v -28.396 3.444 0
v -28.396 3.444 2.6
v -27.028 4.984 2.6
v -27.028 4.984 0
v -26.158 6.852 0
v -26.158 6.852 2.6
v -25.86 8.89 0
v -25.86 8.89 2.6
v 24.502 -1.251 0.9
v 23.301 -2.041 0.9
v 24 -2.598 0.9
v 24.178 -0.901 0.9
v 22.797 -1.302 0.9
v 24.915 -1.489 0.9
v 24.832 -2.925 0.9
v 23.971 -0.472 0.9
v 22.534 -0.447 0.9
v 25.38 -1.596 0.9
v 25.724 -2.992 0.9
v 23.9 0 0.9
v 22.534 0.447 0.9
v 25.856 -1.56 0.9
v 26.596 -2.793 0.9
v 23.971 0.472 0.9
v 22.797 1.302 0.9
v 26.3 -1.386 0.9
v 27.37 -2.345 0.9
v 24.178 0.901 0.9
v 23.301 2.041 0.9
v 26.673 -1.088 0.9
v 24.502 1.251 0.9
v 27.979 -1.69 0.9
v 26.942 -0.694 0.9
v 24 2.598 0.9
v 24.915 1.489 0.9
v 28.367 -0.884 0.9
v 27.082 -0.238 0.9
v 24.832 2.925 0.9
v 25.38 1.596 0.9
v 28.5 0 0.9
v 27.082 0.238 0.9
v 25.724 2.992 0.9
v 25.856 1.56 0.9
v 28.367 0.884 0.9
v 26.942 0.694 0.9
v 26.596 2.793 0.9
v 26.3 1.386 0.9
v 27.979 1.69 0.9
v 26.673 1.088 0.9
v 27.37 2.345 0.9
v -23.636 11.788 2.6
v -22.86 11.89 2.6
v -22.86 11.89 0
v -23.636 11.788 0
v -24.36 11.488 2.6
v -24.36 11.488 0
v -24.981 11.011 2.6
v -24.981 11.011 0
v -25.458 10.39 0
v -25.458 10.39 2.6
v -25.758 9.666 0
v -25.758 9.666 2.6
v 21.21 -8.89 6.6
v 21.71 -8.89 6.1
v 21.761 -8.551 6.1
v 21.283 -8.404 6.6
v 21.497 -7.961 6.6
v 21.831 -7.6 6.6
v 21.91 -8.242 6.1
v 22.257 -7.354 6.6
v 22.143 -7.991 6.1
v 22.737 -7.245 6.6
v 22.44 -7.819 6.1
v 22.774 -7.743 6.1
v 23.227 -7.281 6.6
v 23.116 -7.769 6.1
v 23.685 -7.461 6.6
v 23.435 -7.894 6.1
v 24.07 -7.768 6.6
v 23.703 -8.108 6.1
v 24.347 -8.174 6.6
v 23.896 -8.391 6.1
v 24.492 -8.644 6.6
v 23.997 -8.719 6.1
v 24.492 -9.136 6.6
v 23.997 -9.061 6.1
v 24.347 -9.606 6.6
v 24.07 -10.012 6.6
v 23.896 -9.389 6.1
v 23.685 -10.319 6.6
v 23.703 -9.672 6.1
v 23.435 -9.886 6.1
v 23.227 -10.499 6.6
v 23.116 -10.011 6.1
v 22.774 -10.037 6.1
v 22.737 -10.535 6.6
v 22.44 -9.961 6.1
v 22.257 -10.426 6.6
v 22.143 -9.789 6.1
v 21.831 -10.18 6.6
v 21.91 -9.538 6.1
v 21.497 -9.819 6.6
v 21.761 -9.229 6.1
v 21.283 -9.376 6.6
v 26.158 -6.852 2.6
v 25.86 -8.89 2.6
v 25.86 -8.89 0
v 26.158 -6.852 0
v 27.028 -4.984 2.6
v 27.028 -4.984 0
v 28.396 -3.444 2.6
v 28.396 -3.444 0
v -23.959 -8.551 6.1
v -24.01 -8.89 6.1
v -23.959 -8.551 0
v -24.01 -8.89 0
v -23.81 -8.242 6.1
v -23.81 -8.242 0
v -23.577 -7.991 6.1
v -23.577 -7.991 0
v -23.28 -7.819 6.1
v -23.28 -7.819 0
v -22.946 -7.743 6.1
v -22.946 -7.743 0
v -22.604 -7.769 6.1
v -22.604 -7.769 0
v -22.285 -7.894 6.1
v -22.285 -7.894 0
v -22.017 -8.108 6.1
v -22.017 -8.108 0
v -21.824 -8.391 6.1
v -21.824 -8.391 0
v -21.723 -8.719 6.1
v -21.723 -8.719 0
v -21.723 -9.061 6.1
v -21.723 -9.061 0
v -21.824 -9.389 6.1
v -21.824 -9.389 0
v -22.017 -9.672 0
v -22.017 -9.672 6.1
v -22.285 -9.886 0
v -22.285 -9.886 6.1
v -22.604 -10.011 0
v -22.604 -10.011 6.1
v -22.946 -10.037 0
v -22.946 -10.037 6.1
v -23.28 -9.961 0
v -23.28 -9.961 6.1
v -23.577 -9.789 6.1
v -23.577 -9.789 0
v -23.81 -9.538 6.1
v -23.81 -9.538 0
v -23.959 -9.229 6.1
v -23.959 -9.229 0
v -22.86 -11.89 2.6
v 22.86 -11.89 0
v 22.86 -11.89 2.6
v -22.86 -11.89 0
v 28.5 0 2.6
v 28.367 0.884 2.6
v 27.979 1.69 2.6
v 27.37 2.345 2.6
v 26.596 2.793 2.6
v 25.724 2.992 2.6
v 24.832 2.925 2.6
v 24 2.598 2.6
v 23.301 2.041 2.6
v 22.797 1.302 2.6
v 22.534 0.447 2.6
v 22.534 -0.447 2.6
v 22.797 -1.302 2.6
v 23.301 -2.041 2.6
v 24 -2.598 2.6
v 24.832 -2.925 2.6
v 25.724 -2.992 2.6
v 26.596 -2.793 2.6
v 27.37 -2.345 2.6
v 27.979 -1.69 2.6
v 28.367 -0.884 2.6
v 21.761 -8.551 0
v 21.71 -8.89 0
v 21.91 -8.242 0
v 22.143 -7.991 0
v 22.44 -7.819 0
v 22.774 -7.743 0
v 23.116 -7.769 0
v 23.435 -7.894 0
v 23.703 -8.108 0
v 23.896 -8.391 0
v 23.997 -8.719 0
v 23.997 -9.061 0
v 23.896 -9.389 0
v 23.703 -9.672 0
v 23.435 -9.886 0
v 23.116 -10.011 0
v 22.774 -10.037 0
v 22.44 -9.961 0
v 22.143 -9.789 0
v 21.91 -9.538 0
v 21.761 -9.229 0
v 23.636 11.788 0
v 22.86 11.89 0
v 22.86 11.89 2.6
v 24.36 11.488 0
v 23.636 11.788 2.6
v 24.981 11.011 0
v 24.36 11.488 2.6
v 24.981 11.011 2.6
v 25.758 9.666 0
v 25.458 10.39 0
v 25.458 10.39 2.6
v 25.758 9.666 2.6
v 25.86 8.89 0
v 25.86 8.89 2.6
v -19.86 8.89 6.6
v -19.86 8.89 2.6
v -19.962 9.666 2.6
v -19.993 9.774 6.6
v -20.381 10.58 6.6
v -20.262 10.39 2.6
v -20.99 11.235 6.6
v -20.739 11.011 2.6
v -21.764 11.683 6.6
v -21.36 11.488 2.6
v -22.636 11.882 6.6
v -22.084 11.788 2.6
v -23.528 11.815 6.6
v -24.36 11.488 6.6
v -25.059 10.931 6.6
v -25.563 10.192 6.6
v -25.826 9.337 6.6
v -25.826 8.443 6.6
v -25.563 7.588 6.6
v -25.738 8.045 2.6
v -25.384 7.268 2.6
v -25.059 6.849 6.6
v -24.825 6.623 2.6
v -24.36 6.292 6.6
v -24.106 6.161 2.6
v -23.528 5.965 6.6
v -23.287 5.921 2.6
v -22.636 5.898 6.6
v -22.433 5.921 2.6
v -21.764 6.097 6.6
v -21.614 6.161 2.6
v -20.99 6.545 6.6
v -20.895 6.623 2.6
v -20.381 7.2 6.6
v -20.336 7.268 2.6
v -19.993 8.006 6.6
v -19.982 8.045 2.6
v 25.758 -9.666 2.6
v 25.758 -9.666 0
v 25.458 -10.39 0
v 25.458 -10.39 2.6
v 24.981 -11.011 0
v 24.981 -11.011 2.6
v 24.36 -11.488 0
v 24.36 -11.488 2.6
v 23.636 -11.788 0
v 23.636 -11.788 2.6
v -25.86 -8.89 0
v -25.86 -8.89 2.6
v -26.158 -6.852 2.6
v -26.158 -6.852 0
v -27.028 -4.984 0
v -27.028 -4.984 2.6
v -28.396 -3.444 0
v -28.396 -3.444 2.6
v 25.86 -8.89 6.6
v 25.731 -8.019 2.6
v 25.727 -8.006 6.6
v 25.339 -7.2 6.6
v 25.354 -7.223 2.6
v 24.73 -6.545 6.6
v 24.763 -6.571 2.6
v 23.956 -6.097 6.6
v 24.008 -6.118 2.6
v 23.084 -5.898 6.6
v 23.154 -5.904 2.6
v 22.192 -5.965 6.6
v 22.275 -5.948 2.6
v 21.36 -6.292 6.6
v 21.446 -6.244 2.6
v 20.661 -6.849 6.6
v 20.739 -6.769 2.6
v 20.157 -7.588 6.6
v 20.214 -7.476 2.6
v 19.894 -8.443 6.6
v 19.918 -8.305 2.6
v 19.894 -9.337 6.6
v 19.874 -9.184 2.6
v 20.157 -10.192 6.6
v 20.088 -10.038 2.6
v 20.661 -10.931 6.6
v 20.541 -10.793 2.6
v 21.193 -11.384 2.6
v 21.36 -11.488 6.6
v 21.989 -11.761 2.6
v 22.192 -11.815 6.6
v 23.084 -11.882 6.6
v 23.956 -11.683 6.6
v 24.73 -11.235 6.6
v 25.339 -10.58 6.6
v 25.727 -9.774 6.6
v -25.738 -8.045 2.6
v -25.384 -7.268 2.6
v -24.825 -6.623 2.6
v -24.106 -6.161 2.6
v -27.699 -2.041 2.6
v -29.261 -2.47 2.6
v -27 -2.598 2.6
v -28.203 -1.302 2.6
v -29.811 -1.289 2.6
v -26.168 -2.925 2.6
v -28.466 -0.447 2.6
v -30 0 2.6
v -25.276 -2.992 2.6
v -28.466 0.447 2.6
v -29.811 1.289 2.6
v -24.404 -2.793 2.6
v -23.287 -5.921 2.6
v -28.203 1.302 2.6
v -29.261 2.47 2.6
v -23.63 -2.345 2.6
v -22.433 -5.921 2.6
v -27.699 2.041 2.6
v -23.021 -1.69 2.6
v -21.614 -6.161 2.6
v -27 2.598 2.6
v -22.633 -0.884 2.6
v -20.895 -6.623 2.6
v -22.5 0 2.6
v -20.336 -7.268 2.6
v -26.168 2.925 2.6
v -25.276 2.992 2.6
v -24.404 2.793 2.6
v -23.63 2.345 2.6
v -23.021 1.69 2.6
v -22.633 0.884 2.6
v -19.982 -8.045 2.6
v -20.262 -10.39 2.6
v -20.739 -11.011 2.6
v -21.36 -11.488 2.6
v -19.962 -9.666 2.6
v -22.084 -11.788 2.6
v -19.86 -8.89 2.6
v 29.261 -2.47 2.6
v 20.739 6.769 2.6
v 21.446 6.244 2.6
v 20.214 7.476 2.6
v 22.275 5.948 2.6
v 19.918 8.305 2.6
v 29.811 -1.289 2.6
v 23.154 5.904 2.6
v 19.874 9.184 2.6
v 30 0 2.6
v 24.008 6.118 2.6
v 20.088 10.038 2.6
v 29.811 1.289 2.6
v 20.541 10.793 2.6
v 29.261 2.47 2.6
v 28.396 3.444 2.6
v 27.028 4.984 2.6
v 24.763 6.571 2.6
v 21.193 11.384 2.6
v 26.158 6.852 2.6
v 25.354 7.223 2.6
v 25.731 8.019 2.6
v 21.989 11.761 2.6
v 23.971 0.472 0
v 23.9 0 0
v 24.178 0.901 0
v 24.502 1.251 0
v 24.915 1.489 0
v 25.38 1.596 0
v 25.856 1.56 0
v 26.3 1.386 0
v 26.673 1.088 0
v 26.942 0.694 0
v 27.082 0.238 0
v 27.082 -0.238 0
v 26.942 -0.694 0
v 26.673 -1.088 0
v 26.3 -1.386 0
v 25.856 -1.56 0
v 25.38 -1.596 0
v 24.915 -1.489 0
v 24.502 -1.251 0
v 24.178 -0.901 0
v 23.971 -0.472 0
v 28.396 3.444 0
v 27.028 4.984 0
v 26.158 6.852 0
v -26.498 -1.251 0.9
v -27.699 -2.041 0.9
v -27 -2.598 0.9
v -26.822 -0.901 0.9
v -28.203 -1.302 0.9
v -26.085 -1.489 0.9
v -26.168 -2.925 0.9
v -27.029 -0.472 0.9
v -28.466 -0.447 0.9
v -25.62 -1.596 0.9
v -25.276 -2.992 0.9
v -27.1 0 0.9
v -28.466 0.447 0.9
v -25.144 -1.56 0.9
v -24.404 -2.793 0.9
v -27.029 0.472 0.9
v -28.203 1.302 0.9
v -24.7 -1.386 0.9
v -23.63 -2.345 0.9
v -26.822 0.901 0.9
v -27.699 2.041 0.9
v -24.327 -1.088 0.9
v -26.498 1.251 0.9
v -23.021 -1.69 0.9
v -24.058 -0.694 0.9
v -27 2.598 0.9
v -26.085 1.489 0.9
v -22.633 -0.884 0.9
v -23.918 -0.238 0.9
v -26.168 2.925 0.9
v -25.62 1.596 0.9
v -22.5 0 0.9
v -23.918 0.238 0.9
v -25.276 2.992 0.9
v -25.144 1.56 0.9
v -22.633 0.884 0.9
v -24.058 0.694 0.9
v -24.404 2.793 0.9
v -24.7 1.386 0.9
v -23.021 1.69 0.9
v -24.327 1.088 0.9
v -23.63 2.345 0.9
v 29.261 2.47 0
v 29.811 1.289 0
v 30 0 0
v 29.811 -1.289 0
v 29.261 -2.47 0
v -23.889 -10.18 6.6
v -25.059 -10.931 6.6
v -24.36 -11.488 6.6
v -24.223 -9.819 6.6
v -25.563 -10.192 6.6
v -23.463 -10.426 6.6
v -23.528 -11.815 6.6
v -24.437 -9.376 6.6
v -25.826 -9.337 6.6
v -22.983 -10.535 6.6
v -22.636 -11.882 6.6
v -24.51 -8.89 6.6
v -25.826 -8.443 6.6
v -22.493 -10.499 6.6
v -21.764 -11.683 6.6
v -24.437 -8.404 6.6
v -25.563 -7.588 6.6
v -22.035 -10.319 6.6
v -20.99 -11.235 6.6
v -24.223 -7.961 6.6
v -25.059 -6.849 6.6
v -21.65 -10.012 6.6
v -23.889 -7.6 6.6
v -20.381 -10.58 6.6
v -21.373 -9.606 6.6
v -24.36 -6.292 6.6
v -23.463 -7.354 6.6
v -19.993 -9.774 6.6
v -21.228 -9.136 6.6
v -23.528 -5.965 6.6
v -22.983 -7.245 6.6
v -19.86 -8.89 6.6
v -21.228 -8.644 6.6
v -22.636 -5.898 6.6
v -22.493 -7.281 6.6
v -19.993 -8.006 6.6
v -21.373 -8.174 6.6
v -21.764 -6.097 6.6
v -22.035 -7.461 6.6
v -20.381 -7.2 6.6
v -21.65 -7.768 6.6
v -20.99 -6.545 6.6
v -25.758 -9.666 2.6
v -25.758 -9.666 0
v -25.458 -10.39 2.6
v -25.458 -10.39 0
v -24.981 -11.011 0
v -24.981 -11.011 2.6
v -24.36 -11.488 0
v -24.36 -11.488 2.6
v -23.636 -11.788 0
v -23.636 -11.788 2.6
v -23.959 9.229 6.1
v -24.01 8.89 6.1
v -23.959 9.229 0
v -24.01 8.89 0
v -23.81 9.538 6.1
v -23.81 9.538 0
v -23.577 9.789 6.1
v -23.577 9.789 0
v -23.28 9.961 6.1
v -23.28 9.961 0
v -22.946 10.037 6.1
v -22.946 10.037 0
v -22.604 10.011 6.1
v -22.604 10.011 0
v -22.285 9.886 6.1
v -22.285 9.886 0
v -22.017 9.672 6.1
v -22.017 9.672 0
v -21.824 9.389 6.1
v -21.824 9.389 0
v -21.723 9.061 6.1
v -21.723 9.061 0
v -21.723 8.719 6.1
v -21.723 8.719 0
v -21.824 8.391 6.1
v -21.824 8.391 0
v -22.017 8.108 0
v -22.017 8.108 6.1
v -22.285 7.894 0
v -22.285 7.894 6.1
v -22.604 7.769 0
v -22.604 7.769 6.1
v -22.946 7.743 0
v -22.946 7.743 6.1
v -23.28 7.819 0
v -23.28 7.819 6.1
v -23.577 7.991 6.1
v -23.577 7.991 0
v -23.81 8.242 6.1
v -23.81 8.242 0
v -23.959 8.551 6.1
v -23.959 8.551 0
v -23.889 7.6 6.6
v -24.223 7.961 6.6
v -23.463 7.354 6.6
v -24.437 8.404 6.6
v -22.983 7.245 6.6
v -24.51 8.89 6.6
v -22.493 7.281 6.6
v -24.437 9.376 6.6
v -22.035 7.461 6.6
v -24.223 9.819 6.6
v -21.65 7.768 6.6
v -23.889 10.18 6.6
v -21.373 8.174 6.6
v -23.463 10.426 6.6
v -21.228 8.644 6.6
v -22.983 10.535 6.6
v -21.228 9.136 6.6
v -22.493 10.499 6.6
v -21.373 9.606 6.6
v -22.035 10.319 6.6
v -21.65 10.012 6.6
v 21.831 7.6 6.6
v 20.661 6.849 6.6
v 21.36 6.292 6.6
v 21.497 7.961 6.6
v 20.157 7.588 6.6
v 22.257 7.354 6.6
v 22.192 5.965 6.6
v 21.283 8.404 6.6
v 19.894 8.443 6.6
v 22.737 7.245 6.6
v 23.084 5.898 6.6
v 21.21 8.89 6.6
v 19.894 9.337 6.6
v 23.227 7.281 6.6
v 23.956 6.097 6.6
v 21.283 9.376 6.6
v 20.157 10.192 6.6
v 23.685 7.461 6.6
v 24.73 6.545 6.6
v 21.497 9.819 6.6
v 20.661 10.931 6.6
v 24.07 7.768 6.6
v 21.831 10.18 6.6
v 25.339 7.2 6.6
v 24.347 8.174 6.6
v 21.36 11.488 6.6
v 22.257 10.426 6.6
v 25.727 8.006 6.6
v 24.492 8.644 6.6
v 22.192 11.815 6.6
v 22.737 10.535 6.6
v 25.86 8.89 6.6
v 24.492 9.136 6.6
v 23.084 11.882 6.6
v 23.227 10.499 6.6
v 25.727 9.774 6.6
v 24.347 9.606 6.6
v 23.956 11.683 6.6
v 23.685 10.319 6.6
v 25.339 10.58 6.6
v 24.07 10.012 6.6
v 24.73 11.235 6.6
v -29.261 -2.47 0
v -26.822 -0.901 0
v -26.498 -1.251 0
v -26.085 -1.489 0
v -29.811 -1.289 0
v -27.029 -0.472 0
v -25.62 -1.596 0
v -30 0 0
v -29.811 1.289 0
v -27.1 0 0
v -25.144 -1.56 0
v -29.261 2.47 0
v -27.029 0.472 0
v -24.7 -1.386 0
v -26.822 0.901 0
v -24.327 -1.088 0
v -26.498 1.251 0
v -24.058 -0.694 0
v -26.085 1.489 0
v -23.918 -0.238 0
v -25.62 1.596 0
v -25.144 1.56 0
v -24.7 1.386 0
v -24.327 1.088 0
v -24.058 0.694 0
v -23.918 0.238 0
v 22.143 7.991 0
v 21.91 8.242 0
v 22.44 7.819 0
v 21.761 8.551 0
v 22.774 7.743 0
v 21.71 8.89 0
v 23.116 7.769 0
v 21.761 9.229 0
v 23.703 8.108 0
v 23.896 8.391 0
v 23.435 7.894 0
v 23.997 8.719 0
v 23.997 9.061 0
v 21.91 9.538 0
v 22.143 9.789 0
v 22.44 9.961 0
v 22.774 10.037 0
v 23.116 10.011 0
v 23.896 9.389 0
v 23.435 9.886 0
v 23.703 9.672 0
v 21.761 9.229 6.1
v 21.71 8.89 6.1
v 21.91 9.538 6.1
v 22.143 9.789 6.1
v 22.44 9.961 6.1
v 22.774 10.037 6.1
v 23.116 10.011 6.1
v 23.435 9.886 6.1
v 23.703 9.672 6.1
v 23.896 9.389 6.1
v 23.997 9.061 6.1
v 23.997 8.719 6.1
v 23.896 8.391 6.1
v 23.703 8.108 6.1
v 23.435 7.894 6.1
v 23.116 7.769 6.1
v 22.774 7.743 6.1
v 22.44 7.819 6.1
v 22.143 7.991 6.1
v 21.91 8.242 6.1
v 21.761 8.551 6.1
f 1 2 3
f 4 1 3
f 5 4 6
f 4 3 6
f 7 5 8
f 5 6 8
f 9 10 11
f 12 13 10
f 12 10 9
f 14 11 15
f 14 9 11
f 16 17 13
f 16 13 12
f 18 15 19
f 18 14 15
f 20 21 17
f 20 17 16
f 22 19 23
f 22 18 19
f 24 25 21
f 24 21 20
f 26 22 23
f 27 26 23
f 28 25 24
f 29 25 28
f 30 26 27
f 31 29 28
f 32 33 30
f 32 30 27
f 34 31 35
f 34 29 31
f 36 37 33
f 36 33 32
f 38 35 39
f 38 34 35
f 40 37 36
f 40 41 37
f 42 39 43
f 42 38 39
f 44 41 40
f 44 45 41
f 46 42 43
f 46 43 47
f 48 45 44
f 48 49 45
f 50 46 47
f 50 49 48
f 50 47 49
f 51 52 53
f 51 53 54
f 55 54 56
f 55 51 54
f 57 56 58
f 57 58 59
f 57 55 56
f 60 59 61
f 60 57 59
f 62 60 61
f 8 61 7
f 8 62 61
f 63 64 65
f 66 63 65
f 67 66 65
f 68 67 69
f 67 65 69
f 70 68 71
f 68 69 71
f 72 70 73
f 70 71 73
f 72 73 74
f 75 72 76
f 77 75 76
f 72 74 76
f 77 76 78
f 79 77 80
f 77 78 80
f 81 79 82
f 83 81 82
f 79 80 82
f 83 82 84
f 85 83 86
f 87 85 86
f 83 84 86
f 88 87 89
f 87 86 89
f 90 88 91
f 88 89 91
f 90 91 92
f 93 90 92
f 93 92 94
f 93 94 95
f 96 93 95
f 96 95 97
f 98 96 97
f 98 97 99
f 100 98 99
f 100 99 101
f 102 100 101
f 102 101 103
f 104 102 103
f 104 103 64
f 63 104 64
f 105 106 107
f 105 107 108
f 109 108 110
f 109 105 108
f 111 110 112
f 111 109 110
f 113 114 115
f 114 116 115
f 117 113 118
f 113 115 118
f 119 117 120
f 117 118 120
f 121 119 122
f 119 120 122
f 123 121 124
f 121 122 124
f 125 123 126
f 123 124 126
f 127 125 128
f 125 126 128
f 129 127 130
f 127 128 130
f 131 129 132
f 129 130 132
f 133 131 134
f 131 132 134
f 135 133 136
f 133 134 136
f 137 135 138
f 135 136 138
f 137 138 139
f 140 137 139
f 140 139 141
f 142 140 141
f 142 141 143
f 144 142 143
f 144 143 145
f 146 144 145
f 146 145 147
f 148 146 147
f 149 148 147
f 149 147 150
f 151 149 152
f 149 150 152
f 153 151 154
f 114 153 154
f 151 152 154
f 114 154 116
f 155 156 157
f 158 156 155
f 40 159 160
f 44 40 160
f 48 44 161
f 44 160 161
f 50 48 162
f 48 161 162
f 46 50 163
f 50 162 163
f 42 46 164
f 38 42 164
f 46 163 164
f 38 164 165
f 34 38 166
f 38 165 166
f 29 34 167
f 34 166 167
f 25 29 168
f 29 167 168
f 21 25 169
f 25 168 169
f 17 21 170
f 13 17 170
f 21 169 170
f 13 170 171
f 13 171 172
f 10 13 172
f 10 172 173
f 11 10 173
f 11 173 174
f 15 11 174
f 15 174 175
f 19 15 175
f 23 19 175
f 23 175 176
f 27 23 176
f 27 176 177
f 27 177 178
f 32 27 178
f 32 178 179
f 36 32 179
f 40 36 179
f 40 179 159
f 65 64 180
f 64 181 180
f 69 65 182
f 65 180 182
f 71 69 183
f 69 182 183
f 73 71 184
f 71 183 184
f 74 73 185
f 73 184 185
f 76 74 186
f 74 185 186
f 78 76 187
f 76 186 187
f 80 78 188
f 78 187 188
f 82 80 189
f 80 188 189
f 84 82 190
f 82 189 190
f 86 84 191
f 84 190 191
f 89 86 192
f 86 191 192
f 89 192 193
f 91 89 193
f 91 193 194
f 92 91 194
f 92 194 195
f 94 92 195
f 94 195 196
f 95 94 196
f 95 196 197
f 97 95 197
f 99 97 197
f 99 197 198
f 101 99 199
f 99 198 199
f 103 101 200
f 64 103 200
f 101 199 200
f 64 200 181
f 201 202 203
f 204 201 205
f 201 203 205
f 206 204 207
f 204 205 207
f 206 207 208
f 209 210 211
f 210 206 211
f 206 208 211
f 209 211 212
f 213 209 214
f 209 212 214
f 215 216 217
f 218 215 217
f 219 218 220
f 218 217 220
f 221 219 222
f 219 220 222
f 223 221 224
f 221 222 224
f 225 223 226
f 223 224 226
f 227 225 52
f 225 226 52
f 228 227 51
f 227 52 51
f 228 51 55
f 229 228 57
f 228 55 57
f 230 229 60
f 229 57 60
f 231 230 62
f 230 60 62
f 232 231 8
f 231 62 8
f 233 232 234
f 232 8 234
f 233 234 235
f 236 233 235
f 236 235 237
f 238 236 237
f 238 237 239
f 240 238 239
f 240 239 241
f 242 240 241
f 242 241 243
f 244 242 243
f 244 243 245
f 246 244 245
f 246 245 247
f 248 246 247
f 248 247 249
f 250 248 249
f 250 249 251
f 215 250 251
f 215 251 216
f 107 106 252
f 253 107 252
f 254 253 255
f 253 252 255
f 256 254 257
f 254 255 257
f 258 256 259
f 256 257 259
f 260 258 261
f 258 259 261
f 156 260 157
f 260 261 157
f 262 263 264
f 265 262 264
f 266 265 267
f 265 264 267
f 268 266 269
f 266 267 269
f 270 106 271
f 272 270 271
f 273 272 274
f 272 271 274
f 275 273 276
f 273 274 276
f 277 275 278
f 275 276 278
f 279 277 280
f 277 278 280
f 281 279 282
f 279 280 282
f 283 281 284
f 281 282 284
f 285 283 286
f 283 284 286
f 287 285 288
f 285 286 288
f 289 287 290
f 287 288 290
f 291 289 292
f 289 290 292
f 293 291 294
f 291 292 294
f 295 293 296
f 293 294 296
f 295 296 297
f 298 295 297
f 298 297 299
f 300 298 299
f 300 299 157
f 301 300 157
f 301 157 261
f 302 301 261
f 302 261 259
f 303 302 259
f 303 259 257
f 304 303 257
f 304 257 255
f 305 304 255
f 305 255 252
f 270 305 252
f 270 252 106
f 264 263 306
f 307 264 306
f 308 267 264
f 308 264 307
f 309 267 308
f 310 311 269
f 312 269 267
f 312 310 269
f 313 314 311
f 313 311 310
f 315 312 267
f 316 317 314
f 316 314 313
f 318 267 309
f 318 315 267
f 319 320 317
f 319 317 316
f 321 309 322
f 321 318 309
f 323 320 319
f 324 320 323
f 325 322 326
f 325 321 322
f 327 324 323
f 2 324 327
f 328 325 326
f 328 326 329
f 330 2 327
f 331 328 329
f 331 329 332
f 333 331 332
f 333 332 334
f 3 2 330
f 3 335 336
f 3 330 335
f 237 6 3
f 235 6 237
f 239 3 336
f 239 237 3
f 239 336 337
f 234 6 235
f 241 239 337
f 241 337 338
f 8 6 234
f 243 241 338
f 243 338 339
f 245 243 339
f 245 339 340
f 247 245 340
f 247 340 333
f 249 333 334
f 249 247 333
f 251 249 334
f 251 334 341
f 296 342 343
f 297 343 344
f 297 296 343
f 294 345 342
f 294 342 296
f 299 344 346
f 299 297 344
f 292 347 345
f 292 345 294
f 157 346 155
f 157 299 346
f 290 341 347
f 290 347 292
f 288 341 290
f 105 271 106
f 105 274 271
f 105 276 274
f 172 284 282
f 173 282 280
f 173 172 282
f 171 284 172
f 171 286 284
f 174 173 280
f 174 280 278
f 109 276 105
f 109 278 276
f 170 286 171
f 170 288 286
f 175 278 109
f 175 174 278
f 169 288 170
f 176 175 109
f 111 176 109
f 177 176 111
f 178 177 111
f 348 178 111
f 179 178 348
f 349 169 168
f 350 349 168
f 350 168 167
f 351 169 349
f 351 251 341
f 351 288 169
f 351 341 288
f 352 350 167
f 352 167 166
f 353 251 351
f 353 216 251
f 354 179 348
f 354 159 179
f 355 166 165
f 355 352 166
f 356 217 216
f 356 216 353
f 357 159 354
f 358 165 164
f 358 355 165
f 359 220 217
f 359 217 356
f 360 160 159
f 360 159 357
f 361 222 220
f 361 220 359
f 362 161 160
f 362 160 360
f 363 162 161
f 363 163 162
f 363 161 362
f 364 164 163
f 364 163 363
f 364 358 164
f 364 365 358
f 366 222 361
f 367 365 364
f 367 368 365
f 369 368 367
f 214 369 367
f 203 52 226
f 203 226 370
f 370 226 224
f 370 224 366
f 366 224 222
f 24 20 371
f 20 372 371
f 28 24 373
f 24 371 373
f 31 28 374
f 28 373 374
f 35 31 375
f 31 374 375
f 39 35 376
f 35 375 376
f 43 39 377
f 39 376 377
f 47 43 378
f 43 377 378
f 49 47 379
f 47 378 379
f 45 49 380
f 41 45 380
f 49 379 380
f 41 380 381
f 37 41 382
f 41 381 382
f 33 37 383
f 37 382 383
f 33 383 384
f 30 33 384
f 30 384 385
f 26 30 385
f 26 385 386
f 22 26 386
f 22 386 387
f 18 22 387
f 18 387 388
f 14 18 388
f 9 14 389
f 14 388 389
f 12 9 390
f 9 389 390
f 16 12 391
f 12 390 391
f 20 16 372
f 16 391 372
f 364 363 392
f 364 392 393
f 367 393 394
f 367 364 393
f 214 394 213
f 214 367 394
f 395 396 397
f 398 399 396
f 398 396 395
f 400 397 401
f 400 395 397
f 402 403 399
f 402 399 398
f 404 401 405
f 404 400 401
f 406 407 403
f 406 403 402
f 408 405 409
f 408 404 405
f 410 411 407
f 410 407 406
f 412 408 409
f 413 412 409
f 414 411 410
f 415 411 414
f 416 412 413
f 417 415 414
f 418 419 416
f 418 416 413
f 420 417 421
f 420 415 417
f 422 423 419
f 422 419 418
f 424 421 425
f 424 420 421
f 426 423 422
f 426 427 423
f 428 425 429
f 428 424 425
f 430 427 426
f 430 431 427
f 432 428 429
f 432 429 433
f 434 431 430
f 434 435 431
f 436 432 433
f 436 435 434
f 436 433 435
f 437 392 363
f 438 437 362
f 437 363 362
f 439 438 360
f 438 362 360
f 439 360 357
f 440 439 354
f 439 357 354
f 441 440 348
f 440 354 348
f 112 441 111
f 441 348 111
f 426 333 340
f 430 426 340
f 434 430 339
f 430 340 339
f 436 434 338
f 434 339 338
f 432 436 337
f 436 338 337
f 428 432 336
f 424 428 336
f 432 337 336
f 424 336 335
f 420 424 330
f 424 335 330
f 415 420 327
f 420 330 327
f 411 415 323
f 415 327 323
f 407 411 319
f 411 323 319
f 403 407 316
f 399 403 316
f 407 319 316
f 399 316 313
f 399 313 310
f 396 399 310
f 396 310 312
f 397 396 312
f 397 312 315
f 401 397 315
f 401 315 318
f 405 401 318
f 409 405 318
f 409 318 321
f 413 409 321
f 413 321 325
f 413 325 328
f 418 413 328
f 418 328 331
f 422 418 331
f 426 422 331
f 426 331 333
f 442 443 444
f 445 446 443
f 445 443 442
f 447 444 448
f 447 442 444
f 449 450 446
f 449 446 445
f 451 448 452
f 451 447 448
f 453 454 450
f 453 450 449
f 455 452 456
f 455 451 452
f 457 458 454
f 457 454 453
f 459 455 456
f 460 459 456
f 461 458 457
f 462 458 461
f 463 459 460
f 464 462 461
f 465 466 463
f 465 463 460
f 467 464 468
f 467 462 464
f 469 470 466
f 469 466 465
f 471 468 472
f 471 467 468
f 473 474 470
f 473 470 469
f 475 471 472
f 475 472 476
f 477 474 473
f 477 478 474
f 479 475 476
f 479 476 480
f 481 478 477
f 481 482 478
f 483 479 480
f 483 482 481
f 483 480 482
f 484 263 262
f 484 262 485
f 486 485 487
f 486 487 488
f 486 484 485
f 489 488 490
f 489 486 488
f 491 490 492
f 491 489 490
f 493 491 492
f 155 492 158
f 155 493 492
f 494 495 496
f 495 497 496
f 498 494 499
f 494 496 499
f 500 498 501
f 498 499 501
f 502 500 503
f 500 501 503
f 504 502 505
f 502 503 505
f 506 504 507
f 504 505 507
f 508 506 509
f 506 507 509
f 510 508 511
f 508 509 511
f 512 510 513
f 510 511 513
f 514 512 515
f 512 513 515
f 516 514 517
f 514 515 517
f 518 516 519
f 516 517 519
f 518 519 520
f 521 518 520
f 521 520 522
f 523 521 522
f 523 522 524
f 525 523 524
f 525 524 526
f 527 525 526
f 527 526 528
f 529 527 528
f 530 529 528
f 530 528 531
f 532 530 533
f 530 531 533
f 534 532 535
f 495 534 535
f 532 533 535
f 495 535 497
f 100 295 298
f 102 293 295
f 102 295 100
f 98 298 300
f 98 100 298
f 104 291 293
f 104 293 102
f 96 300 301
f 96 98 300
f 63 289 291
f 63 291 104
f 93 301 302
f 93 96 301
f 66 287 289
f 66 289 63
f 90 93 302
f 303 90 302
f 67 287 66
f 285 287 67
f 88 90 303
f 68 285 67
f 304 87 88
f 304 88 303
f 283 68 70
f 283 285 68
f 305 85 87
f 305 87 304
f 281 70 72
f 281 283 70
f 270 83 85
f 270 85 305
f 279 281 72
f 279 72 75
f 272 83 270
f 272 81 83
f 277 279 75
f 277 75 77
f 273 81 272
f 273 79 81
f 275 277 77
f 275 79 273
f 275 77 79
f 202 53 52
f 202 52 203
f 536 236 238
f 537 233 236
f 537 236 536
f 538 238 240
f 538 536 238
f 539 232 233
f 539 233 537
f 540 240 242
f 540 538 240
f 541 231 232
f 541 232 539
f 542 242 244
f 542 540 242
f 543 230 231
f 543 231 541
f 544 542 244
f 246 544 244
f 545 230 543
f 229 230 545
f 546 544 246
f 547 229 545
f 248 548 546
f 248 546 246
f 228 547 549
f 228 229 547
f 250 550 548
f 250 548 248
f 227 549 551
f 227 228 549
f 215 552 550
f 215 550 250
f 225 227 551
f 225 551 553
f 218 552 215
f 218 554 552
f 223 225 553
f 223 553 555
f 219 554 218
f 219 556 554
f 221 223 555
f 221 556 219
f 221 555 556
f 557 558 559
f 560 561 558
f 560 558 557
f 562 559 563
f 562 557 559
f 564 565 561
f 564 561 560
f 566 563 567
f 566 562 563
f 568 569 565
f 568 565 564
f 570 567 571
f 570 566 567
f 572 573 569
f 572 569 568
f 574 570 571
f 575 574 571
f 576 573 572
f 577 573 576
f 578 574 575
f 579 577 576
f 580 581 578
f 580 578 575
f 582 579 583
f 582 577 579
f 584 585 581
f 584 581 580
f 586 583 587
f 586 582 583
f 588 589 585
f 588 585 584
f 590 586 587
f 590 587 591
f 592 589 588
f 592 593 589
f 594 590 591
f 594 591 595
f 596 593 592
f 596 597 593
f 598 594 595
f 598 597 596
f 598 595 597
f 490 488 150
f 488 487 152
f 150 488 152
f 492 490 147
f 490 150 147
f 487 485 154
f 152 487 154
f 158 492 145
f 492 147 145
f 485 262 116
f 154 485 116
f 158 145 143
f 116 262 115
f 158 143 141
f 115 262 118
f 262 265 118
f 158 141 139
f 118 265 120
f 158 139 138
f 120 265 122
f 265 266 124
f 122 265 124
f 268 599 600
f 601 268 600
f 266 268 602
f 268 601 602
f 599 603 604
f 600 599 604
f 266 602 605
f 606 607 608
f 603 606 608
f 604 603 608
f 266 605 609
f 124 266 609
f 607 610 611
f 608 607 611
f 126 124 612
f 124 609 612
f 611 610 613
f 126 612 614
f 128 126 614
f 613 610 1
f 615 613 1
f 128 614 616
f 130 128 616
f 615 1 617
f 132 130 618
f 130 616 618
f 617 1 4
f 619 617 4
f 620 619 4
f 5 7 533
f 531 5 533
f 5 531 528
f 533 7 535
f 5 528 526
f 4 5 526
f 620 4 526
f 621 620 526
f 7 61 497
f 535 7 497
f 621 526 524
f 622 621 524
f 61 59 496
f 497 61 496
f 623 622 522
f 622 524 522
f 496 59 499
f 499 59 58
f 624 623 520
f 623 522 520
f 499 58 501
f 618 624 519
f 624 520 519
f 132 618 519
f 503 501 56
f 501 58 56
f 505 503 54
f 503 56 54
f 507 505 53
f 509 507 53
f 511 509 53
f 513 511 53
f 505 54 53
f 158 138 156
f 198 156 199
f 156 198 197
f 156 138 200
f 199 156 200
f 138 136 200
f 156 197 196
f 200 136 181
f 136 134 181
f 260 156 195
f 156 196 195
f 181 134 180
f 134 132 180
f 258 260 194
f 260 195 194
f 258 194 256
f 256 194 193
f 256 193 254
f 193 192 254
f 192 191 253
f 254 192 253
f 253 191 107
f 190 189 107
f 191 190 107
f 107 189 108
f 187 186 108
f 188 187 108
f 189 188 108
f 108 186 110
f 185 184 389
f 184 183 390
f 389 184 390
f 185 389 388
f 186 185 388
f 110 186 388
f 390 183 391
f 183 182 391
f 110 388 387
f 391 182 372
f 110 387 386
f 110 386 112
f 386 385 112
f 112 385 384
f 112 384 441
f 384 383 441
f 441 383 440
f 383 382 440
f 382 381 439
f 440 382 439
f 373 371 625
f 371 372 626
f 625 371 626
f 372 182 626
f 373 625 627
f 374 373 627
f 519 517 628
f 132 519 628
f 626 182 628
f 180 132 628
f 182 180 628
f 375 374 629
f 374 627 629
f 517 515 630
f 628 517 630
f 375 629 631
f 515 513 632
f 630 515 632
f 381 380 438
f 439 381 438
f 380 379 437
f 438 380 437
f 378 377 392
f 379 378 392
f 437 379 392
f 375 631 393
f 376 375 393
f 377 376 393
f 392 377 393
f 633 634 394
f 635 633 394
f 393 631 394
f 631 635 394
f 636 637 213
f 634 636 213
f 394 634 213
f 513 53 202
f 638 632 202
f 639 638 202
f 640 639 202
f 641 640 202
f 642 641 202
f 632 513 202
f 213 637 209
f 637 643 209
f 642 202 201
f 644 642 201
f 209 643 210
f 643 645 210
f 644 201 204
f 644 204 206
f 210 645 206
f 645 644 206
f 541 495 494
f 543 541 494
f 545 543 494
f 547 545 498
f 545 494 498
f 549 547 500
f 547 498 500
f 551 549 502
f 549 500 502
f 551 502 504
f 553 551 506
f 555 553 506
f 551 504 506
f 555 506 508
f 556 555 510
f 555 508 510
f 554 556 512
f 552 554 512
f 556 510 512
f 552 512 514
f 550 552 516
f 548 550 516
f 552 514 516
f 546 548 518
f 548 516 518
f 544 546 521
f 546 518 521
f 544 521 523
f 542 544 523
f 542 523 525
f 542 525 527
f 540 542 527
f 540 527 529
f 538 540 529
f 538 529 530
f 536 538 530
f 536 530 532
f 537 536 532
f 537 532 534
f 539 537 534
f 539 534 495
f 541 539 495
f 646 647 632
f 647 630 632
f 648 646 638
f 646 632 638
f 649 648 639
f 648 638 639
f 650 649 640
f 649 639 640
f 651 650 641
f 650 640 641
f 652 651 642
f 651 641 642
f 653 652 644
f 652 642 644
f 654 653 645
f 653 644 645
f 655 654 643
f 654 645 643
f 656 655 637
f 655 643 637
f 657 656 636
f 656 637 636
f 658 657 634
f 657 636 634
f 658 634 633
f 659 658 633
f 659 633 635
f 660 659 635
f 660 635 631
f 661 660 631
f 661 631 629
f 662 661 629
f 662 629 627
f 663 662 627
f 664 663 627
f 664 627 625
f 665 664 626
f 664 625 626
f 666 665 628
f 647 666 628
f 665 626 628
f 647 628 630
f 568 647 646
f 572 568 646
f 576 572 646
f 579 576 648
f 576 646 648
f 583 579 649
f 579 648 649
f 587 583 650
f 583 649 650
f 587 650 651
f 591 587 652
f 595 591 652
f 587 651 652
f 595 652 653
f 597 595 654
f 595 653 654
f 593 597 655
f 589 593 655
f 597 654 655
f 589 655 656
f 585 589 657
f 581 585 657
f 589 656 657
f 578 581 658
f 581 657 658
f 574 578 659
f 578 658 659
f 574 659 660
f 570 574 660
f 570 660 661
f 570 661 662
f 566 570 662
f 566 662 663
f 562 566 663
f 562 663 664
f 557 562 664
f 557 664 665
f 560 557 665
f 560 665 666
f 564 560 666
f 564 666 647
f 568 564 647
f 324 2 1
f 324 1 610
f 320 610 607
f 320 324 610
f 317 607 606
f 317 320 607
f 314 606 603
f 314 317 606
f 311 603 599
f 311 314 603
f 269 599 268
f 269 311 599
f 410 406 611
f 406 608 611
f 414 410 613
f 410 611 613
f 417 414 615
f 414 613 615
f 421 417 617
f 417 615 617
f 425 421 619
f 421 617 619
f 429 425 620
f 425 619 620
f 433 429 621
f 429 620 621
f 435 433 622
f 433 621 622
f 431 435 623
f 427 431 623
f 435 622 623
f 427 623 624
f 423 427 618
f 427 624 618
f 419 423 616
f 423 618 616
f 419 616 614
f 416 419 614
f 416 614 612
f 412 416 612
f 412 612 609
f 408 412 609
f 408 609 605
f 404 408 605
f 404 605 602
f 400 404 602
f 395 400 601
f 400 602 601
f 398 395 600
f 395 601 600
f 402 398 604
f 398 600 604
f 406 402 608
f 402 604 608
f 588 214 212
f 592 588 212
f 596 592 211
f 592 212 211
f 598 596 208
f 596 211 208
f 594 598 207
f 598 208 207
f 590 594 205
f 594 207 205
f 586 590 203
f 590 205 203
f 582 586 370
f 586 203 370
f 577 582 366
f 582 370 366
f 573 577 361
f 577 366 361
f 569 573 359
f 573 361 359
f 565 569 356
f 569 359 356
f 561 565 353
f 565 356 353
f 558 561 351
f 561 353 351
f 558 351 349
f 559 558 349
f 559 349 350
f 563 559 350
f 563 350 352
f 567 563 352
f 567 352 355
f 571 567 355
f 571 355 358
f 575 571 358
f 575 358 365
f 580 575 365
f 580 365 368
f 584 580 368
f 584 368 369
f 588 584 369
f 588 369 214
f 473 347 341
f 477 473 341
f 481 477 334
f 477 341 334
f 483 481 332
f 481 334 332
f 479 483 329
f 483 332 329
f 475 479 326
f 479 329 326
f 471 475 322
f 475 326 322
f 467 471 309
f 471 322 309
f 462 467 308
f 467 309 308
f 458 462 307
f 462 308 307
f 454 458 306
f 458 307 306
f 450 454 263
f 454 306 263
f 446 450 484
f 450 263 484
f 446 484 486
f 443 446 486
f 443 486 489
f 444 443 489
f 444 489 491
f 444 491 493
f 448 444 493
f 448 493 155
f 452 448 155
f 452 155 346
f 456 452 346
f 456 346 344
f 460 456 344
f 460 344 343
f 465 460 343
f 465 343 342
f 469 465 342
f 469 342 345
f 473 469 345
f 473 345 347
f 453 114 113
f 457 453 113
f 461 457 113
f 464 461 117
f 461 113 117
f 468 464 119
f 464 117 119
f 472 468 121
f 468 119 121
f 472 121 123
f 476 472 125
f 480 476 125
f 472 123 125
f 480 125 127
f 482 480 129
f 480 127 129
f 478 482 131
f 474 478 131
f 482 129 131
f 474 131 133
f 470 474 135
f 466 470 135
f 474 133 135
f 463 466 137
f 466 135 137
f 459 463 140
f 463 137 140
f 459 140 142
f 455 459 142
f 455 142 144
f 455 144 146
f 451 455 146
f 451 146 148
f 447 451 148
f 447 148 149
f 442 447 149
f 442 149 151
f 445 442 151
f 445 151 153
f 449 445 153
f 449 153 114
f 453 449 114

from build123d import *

# Parameters (mm, degrees)
SKETCH013_R         = 0.5
PAD006_DEPTH        = 2.6
SKETCH014_R         = 3
SKETCH014_R_2       = 0.5
PAD007_DEPTH        = 4
HOLE007_D           = 2.3
HOLE007_CSINK_D     = 3.3
HOLE007_CSINK_ANGLE = 90
HOLE008_D           = 3.2
HOLE008_CBORE_D     = 6
HOLE008_CBORE_DEPTH = 1.7
POCKET_DEPTH        = 132.355359


with BuildPart() as part:
    # Sketch013 → Pad006 (new body)
    with BuildSketch(Plane.XY):
        with BuildLine():
            ThreePointArc((-27, 11.89), (-29.12132, 11.01132), (-30, 8.89))
            Line((-30, -8.89), (-30, 8.89))
            ThreePointArc((-30, -8.89), (-29.12132, -11.01132), (-27, -11.89))
            Line((27, -11.89), (-27, -11.89))
            ThreePointArc((27, -11.89), (29.12132, -11.01132), (30, -8.89))
            Line((30, 8.89), (30, -8.89))
            ThreePointArc((30, 8.89), (29.12132, 11.01132), (27, 11.89))
            Line((-27, 11.89), (27, 11.89))
        make_face()
        with Locations((-22.86, 8.89)):
            Circle(SKETCH013_R, mode=Mode.SUBTRACT)
        with Locations((22.86, 8.89)):
            Circle(SKETCH013_R, mode=Mode.SUBTRACT)
        with Locations((22.86, -8.89)):
            Circle(SKETCH013_R, mode=Mode.SUBTRACT)
        with Locations((-22.86, -8.89)):
            Circle(SKETCH013_R, mode=Mode.SUBTRACT)
    extrude(amount=PAD006_DEPTH)

    # Sketch014 (on Face14 of Pad006) → Pad007 (join)
    with BuildSketch(Plane.XY.offset(2.6)):
        with Locations((-22.86, 8.89)):
            Circle(SKETCH014_R)
        with Locations((-22.86, 8.89)):
            Circle(SKETCH014_R_2, mode=Mode.SUBTRACT)
        with Locations((22.86, 8.89)):
            Circle(SKETCH014_R)
        with Locations((22.86, 8.89)):
            Circle(SKETCH014_R_2, mode=Mode.SUBTRACT)
        with Locations((-22.86, -8.89)):
            Circle(SKETCH014_R)
        with Locations((-22.86, -8.89)):
            Circle(SKETCH014_R_2, mode=Mode.SUBTRACT)
        with Locations((22.86, -8.89)):
            Circle(SKETCH014_R)
        with Locations((22.86, -8.89)):
            Circle(SKETCH014_R_2, mode=Mode.SUBTRACT)
    extrude(amount=PAD007_DEPTH)

    # Hole007 (through all)
    with Locations(Plane.XY.offset(6.6)):
        with Locations((-22.86, 8.89), (22.86, 8.89), (22.86, -8.89), (-22.86, -8.89)):
            CounterSinkHole(HOLE007_D / 2, HOLE007_CSINK_D / 2, counter_sink_angle=HOLE007_CSINK_ANGLE)

    # Hole008 (through all)
    with Locations(Plane.XY.offset(2.6)):
        with Locations((-25.5, 0), (25.5, 0)):
            CounterBoreHole(HOLE008_D / 2, HOLE008_CBORE_D / 2, HOLE008_CBORE_DEPTH)

    # Sketch017 (on Face5 of Hole008) → Pocket (cut, through all)
    with BuildSketch(Plane.XY.offset(2.6)):
        with BuildLine():
            ThreePointArc((-22.86, 11.89), (-24.98132, 11.01132), (-25.86, 8.89))
            ThreePointArc((-28.396031, 3.444271), (-26.525094, 5.88636), (-25.86, 8.89))
            ThreePointArc((-28.396031, 3.444271), (-30, 0), (-28.396031, -3.444271))
            ThreePointArc((-25.86, -8.89), (-26.525094, -5.88636), (-28.396031, -3.444271))
            ThreePointArc((-25.86, -8.89), (-24.98132, -11.01132), (-22.86, -11.89))
            Line((-32.97494, -11.89), (-22.86, -11.89))
            Line((-32.97494, -8.89), (-32.97494, -11.89))
            Line((-32.97494, 8.89), (-32.97494, -8.89))
            Line((-32.97494, 8.89), (-32.97494, 11.89))
            Line((-32.97494, 11.89), (-22.86, 11.89))
        make_face()
    pocket = extrude(amount=-POCKET_DEPTH, mode=Mode.SUBTRACT)

    # Mirrored005: Pocket across Sketch017 V_Axis
    add(pocket.mirror(Plane(origin=(0, 0, 2.6), x_dir=(0, 0, 1), z_dir=(1, 0, 0))), mode=Mode.SUBTRACT)


solid = part.part
